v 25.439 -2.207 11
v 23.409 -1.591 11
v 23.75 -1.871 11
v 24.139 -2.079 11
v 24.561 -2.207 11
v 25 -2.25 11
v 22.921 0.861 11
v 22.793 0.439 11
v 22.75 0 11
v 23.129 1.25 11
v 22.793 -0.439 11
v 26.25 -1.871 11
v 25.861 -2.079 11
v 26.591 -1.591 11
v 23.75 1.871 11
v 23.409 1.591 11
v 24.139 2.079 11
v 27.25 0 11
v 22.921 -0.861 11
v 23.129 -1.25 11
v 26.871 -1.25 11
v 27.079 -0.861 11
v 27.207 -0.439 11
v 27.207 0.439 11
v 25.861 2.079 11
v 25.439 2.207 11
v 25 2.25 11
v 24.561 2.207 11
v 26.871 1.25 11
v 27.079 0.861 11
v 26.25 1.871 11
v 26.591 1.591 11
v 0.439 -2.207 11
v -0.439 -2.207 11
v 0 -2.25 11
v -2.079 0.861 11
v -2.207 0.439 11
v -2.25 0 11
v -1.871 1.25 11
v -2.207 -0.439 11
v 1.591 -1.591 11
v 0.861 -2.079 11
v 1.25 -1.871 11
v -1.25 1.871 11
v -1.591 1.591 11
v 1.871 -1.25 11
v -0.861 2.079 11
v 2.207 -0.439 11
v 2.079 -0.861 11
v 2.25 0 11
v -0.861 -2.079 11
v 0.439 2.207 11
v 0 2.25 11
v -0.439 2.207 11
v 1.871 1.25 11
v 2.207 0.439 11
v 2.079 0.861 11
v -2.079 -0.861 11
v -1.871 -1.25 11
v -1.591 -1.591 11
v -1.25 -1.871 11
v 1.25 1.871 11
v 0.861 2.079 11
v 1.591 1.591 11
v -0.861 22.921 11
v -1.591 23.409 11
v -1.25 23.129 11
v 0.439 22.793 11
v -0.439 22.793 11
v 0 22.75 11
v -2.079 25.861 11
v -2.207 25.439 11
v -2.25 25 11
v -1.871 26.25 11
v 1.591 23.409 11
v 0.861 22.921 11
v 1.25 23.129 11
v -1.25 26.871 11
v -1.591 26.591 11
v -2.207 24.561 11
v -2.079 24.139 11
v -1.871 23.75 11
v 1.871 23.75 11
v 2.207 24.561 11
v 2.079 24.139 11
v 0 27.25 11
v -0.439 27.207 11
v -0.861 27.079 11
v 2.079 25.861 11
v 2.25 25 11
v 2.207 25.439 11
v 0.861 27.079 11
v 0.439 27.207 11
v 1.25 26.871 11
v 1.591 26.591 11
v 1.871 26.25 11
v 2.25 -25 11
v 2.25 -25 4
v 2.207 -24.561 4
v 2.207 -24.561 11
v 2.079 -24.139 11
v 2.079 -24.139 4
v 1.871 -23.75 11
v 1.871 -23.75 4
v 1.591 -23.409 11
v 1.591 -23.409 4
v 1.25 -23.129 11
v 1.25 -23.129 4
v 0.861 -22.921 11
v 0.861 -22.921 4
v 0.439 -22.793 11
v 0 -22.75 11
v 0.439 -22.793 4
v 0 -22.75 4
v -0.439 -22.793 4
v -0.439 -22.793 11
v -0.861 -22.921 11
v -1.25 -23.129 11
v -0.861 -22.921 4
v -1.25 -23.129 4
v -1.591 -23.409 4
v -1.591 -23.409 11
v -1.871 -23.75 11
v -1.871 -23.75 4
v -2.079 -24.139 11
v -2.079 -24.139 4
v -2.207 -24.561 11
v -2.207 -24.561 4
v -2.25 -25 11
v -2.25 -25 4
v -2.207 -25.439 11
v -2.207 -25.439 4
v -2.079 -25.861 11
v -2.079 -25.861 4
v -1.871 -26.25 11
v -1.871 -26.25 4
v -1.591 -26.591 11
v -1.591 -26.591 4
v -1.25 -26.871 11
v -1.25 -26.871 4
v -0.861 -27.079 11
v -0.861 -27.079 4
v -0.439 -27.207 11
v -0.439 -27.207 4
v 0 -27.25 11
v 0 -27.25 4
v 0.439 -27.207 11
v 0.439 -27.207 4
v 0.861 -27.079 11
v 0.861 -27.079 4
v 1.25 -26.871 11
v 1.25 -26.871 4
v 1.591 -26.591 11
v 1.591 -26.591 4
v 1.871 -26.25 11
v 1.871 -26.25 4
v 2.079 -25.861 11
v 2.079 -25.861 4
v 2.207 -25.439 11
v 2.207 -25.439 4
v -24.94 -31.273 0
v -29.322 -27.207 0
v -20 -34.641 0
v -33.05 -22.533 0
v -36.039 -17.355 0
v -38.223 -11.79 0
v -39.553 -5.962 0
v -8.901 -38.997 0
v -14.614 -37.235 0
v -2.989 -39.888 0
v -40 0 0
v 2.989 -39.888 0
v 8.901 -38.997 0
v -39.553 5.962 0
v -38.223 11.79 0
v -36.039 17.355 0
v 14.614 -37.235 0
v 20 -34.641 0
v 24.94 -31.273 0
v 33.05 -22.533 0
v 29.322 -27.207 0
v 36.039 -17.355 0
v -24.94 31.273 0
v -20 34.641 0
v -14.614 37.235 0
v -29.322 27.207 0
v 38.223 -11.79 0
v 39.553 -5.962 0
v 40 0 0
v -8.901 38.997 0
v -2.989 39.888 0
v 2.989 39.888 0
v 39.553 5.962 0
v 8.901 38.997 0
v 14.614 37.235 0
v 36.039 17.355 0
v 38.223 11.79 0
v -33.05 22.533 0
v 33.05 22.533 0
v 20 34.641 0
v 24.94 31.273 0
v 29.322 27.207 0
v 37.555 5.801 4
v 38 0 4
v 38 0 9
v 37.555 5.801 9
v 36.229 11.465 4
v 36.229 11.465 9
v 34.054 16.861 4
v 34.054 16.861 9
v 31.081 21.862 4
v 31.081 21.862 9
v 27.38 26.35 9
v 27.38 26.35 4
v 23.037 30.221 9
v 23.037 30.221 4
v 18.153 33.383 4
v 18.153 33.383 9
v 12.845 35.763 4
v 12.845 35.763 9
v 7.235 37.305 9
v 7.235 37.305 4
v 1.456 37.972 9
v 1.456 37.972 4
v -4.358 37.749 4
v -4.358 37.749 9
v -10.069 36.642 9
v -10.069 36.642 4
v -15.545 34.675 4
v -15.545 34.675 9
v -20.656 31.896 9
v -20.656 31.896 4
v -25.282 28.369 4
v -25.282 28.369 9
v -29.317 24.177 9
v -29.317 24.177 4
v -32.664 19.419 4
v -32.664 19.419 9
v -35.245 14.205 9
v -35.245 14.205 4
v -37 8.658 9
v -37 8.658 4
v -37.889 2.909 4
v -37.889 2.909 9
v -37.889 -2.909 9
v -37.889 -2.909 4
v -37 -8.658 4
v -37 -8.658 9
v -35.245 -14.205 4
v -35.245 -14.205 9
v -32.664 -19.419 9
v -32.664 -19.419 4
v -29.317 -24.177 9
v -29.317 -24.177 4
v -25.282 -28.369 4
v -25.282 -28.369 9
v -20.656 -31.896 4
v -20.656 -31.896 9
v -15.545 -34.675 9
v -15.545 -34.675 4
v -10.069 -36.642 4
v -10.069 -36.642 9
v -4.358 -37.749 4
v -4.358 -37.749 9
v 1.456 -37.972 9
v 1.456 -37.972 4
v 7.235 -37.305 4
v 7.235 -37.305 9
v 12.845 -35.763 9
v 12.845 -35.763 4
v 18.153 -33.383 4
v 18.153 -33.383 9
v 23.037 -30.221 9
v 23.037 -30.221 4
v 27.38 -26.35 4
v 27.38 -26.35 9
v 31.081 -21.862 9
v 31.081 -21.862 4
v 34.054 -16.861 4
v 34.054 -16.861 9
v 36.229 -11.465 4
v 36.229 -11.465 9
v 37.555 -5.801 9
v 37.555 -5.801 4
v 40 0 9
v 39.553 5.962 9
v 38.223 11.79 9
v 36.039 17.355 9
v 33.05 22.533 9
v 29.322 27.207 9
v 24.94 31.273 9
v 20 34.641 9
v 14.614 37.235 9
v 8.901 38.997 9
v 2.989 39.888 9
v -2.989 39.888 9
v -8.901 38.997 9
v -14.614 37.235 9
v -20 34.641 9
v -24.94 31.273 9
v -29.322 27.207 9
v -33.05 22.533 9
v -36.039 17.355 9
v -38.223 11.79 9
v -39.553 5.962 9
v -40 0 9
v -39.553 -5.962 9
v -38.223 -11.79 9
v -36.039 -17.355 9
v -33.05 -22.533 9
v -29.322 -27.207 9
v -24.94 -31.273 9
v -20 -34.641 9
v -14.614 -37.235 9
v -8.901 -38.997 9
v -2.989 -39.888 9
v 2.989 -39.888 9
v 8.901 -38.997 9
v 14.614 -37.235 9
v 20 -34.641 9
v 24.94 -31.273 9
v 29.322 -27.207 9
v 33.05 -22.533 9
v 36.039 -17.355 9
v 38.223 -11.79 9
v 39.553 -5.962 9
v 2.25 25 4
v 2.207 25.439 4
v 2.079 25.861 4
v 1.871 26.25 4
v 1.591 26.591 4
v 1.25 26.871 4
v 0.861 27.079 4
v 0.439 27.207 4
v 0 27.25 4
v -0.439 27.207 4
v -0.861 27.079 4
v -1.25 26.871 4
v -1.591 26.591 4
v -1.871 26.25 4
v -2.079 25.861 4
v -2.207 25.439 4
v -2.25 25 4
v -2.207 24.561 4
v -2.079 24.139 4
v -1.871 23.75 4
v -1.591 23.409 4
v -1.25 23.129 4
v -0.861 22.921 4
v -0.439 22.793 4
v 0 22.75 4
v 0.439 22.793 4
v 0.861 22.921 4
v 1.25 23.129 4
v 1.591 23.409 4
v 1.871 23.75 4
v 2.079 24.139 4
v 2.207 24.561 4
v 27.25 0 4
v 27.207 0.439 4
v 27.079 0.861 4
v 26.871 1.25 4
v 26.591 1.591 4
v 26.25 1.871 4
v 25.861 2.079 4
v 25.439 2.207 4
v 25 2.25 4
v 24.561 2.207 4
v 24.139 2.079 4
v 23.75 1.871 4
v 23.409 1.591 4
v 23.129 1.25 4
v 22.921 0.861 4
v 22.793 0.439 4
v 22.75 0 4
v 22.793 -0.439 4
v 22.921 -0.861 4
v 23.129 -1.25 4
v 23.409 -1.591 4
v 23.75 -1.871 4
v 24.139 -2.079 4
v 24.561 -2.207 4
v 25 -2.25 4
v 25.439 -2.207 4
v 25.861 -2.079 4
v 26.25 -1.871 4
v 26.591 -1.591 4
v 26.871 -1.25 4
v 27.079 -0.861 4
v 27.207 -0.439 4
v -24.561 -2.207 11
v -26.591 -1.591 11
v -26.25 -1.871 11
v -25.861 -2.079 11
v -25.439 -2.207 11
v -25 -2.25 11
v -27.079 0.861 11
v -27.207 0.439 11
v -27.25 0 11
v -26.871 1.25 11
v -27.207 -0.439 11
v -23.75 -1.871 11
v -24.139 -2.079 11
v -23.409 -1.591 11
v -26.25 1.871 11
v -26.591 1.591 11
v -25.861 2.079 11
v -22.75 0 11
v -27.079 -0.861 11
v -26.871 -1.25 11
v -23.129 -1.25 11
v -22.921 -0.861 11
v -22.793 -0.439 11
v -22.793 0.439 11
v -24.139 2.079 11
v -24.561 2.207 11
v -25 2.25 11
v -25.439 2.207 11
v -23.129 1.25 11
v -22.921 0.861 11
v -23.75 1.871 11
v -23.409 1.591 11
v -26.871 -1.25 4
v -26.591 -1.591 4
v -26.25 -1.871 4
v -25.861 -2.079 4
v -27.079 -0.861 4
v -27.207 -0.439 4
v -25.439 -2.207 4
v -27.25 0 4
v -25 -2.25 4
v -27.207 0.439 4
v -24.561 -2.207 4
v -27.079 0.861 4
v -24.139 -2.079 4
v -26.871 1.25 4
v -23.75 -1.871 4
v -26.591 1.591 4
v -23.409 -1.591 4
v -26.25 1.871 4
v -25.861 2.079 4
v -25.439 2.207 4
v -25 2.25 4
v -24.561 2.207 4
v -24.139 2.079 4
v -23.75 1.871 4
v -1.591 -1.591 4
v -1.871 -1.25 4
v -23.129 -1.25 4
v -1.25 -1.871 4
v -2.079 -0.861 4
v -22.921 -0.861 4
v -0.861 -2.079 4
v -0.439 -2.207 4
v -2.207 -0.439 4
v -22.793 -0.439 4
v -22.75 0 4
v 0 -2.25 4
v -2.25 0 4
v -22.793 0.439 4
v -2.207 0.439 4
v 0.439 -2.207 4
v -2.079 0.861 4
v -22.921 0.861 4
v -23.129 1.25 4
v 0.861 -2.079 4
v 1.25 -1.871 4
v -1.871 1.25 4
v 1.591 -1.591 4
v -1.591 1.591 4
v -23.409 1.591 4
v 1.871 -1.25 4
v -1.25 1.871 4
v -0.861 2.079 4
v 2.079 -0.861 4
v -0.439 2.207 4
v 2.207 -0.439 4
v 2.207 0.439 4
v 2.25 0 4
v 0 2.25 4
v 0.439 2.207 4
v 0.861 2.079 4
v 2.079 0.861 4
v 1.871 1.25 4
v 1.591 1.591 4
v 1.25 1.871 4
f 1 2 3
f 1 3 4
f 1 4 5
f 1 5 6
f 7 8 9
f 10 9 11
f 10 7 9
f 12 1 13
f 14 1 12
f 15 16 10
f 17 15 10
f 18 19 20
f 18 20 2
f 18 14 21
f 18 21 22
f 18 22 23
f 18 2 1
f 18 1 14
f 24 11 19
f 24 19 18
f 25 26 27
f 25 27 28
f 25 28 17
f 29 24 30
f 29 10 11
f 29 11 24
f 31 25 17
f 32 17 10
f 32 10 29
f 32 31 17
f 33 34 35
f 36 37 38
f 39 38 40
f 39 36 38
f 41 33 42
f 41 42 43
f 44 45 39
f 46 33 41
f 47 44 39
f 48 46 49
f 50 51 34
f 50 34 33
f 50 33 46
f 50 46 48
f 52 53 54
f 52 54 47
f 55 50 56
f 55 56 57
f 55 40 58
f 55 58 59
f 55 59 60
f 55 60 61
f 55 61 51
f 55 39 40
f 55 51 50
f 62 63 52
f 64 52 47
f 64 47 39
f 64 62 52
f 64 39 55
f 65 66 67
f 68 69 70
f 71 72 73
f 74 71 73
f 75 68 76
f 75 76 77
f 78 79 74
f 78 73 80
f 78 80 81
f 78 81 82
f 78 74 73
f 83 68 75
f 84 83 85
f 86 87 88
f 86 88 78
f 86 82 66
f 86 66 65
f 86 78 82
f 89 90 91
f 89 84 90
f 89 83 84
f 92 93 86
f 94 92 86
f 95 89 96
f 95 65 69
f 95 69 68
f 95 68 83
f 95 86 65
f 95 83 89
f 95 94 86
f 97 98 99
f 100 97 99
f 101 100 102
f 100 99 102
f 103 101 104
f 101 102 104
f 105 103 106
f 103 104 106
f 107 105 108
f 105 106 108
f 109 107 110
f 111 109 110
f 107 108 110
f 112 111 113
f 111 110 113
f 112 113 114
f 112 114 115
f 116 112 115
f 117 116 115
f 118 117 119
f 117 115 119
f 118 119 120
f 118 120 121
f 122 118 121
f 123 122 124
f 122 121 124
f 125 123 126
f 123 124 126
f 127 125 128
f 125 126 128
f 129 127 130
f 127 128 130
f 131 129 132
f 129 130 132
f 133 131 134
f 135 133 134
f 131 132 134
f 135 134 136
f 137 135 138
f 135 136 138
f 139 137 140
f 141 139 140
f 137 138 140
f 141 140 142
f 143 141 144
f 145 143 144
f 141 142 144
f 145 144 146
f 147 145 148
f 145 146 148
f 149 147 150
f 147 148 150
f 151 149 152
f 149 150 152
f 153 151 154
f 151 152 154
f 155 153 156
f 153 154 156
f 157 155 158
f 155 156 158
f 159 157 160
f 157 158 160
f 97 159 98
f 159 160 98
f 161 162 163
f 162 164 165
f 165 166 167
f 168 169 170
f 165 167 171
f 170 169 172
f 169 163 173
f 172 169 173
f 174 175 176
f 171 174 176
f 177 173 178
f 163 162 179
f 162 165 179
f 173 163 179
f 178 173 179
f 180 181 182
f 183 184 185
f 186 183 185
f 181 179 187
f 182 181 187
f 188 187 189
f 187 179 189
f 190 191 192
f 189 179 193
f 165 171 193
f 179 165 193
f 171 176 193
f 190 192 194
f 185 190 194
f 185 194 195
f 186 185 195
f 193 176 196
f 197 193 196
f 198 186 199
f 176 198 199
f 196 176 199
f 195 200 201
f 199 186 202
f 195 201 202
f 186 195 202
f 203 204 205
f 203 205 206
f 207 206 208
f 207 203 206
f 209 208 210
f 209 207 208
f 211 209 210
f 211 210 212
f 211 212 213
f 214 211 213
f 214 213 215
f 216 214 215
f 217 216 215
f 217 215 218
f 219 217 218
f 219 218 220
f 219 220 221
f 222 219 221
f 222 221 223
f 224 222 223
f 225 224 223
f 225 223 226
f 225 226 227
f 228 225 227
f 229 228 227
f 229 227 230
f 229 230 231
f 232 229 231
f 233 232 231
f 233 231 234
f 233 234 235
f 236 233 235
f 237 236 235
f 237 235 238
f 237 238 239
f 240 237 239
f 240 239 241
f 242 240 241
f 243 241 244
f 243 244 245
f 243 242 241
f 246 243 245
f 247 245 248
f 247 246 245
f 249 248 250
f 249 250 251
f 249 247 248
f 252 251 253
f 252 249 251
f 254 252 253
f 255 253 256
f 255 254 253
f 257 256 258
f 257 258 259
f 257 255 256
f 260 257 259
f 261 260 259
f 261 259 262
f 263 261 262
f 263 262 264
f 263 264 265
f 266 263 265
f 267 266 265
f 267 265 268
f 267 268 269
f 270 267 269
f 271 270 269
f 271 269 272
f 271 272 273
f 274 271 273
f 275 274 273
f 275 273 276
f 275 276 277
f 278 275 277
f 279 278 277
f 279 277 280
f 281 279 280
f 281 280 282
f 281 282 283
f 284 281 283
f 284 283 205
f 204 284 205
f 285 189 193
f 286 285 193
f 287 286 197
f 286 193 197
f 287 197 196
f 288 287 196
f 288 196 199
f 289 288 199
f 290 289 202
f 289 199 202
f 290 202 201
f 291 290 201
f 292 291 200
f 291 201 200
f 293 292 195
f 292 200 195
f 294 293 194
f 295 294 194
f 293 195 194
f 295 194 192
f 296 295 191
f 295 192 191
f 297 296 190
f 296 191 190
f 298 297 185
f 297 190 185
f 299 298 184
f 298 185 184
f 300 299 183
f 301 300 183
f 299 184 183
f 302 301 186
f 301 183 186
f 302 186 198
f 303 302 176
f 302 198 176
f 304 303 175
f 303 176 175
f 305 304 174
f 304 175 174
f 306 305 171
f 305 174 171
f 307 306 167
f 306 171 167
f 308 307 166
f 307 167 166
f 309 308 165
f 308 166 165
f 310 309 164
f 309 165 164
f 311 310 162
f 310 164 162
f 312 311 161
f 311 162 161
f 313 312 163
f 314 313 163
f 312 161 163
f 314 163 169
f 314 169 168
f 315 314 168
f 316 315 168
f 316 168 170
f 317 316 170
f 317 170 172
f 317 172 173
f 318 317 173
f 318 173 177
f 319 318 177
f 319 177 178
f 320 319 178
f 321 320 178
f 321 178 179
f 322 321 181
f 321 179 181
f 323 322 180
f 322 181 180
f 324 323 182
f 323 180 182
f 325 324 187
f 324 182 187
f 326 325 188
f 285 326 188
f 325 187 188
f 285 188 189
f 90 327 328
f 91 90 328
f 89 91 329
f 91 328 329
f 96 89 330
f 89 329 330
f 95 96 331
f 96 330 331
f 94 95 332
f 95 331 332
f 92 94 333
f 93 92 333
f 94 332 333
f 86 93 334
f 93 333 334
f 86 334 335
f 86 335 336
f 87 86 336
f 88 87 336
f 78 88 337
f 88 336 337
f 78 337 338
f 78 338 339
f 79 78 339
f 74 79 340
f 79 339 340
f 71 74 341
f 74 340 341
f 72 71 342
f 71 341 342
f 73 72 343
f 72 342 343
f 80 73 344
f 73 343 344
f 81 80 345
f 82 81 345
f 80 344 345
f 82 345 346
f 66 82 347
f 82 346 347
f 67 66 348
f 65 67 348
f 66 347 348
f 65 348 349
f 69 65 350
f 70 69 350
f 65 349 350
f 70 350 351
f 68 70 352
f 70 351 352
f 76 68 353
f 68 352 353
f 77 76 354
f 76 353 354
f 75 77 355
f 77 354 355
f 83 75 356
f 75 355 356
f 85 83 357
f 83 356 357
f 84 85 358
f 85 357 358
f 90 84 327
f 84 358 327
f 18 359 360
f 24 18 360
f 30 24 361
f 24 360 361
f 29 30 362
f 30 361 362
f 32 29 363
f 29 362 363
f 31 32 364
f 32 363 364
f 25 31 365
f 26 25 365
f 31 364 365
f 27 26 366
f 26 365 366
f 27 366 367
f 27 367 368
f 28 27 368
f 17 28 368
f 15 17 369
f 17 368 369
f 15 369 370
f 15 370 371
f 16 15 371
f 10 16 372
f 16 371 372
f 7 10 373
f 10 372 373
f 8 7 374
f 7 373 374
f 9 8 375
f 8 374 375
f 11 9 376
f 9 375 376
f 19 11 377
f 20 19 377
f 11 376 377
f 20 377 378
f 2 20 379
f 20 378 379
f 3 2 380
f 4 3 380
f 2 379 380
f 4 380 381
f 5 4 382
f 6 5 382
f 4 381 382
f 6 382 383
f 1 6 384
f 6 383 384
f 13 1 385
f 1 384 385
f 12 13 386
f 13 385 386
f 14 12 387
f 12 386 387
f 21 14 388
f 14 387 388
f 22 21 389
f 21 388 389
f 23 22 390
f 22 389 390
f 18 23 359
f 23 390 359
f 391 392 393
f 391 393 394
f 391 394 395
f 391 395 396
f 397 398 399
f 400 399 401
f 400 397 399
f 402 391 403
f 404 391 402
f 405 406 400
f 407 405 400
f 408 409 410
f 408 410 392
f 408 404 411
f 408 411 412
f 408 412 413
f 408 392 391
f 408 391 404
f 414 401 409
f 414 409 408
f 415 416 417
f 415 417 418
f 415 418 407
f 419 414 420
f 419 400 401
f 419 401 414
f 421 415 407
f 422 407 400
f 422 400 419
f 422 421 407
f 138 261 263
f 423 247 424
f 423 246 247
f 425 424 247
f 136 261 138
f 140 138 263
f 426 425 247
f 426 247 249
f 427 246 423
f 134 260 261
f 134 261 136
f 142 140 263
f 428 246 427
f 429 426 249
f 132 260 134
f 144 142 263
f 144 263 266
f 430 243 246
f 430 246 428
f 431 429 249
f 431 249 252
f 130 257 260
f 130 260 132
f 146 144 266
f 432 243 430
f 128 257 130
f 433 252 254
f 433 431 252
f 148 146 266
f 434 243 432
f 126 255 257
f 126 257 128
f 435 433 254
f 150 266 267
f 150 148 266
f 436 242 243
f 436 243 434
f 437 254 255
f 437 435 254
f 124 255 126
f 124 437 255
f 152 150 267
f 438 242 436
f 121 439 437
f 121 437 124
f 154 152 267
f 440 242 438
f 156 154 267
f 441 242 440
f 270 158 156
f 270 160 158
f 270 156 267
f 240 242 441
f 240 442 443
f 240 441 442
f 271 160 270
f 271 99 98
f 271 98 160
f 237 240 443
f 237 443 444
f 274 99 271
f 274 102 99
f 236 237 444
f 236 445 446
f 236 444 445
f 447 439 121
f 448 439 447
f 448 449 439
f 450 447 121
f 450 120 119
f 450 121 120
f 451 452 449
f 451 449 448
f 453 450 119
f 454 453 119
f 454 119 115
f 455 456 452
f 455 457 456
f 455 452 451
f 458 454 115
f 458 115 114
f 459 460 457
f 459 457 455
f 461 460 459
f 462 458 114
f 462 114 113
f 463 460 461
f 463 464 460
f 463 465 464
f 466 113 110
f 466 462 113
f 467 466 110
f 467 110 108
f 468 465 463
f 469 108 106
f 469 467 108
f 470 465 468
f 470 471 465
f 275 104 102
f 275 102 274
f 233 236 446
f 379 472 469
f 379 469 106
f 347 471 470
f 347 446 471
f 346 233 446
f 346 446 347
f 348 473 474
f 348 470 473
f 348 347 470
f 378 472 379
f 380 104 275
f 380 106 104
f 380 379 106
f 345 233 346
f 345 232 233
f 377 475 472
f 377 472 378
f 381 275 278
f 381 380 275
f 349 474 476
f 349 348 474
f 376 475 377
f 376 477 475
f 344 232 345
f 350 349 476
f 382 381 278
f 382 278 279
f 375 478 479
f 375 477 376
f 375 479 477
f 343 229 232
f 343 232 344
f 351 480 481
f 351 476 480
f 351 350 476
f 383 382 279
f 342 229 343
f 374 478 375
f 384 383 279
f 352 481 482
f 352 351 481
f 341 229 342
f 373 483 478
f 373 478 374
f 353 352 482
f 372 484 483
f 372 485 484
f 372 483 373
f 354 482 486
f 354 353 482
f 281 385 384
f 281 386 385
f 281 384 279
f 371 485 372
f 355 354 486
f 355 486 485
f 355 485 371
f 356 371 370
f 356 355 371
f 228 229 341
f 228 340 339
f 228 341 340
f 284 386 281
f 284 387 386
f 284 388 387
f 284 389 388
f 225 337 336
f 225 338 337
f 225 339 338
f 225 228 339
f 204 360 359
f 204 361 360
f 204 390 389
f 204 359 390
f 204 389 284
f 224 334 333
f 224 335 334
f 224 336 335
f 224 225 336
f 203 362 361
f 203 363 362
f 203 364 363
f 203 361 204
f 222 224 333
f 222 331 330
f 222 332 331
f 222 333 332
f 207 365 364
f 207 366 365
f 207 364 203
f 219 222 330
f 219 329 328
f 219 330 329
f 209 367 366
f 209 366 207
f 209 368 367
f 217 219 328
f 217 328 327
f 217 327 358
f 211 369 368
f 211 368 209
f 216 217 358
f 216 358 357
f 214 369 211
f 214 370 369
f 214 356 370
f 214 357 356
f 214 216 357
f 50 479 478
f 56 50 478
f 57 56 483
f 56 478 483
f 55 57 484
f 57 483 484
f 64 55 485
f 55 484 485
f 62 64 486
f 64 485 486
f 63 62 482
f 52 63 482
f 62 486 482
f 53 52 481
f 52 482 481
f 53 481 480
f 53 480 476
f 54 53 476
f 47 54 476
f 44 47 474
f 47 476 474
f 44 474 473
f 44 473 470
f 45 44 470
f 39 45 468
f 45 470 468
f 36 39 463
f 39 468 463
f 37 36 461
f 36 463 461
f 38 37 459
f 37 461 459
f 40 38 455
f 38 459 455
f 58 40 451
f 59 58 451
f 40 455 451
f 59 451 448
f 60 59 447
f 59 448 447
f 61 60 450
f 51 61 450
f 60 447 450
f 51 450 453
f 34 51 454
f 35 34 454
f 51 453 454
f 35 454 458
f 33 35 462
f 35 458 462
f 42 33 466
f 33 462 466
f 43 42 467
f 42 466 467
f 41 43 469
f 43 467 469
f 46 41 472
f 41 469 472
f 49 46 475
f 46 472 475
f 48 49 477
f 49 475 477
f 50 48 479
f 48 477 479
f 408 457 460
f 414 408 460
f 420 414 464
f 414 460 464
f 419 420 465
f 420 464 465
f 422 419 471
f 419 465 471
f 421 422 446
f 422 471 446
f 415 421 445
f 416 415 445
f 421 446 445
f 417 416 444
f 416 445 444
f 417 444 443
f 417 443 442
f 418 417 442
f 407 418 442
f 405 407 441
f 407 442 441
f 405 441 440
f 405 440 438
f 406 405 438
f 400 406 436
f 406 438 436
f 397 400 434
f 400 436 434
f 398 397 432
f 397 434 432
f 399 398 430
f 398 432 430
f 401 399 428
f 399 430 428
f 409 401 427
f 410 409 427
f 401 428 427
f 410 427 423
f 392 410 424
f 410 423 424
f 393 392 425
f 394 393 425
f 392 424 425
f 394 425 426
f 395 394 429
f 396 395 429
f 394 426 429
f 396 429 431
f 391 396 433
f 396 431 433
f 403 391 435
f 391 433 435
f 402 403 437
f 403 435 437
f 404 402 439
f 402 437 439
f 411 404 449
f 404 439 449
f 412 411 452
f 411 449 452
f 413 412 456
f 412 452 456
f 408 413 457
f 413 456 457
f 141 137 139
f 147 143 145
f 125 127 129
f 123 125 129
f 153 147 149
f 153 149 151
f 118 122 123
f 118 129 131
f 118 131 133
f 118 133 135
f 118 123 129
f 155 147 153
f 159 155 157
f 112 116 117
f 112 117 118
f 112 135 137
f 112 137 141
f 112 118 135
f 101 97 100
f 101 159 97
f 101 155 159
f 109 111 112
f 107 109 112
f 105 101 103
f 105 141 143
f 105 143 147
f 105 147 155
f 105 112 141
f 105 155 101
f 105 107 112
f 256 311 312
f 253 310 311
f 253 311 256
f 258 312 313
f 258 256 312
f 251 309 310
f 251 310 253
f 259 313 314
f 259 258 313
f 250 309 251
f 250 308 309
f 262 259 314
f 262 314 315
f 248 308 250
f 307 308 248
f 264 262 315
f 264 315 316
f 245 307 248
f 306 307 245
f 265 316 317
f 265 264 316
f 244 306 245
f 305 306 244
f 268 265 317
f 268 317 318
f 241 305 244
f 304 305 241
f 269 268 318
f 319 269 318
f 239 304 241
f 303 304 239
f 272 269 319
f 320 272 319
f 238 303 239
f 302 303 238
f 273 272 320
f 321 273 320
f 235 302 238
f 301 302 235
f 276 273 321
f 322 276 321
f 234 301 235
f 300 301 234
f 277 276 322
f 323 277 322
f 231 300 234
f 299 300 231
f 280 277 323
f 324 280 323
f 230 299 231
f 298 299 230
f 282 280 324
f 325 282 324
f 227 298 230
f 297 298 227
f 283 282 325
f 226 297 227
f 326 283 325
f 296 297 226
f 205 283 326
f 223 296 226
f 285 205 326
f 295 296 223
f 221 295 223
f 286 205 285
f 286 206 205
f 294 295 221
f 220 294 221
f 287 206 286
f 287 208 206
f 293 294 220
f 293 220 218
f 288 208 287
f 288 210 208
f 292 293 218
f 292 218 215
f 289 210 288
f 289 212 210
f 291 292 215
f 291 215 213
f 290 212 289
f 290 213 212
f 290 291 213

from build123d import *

# Parameters (mm, degrees)
F0_R     = 40
F0_R_2   = 38
F1_DEPTH = 9
F2_DEPTH = 4
F3_R     = 2.25
F4_DEPTH = 7


with BuildPart() as f1:
    # F0 (on Top) → F1 (new body)
    with BuildSketch(Plane.XY):
        Circle(F0_R)
        Circle(F0_R_2, mode=Mode.SUBTRACT)
    extrude(amount=F1_DEPTH)

    # F0 (on Top) → F2 (join)
    with BuildSketch(Plane.XY):
        Circle(F0_R_2)
    extrude(amount=F2_DEPTH)

    # F3 (on face) → F4 (join)
    with BuildSketch(Plane.XY.offset(4)):
        Circle(F3_R)
        with Locations((-25, 0)):
            Circle(F3_R)
        with Locations((25, 0)):
            Circle(F3_R)
        with Locations((0, 25)):
            Circle(F3_R)
        with Locations((0, -25)):
            Circle(F3_R)
    extrude(amount=F4_DEPTH)


solid = f1.part
